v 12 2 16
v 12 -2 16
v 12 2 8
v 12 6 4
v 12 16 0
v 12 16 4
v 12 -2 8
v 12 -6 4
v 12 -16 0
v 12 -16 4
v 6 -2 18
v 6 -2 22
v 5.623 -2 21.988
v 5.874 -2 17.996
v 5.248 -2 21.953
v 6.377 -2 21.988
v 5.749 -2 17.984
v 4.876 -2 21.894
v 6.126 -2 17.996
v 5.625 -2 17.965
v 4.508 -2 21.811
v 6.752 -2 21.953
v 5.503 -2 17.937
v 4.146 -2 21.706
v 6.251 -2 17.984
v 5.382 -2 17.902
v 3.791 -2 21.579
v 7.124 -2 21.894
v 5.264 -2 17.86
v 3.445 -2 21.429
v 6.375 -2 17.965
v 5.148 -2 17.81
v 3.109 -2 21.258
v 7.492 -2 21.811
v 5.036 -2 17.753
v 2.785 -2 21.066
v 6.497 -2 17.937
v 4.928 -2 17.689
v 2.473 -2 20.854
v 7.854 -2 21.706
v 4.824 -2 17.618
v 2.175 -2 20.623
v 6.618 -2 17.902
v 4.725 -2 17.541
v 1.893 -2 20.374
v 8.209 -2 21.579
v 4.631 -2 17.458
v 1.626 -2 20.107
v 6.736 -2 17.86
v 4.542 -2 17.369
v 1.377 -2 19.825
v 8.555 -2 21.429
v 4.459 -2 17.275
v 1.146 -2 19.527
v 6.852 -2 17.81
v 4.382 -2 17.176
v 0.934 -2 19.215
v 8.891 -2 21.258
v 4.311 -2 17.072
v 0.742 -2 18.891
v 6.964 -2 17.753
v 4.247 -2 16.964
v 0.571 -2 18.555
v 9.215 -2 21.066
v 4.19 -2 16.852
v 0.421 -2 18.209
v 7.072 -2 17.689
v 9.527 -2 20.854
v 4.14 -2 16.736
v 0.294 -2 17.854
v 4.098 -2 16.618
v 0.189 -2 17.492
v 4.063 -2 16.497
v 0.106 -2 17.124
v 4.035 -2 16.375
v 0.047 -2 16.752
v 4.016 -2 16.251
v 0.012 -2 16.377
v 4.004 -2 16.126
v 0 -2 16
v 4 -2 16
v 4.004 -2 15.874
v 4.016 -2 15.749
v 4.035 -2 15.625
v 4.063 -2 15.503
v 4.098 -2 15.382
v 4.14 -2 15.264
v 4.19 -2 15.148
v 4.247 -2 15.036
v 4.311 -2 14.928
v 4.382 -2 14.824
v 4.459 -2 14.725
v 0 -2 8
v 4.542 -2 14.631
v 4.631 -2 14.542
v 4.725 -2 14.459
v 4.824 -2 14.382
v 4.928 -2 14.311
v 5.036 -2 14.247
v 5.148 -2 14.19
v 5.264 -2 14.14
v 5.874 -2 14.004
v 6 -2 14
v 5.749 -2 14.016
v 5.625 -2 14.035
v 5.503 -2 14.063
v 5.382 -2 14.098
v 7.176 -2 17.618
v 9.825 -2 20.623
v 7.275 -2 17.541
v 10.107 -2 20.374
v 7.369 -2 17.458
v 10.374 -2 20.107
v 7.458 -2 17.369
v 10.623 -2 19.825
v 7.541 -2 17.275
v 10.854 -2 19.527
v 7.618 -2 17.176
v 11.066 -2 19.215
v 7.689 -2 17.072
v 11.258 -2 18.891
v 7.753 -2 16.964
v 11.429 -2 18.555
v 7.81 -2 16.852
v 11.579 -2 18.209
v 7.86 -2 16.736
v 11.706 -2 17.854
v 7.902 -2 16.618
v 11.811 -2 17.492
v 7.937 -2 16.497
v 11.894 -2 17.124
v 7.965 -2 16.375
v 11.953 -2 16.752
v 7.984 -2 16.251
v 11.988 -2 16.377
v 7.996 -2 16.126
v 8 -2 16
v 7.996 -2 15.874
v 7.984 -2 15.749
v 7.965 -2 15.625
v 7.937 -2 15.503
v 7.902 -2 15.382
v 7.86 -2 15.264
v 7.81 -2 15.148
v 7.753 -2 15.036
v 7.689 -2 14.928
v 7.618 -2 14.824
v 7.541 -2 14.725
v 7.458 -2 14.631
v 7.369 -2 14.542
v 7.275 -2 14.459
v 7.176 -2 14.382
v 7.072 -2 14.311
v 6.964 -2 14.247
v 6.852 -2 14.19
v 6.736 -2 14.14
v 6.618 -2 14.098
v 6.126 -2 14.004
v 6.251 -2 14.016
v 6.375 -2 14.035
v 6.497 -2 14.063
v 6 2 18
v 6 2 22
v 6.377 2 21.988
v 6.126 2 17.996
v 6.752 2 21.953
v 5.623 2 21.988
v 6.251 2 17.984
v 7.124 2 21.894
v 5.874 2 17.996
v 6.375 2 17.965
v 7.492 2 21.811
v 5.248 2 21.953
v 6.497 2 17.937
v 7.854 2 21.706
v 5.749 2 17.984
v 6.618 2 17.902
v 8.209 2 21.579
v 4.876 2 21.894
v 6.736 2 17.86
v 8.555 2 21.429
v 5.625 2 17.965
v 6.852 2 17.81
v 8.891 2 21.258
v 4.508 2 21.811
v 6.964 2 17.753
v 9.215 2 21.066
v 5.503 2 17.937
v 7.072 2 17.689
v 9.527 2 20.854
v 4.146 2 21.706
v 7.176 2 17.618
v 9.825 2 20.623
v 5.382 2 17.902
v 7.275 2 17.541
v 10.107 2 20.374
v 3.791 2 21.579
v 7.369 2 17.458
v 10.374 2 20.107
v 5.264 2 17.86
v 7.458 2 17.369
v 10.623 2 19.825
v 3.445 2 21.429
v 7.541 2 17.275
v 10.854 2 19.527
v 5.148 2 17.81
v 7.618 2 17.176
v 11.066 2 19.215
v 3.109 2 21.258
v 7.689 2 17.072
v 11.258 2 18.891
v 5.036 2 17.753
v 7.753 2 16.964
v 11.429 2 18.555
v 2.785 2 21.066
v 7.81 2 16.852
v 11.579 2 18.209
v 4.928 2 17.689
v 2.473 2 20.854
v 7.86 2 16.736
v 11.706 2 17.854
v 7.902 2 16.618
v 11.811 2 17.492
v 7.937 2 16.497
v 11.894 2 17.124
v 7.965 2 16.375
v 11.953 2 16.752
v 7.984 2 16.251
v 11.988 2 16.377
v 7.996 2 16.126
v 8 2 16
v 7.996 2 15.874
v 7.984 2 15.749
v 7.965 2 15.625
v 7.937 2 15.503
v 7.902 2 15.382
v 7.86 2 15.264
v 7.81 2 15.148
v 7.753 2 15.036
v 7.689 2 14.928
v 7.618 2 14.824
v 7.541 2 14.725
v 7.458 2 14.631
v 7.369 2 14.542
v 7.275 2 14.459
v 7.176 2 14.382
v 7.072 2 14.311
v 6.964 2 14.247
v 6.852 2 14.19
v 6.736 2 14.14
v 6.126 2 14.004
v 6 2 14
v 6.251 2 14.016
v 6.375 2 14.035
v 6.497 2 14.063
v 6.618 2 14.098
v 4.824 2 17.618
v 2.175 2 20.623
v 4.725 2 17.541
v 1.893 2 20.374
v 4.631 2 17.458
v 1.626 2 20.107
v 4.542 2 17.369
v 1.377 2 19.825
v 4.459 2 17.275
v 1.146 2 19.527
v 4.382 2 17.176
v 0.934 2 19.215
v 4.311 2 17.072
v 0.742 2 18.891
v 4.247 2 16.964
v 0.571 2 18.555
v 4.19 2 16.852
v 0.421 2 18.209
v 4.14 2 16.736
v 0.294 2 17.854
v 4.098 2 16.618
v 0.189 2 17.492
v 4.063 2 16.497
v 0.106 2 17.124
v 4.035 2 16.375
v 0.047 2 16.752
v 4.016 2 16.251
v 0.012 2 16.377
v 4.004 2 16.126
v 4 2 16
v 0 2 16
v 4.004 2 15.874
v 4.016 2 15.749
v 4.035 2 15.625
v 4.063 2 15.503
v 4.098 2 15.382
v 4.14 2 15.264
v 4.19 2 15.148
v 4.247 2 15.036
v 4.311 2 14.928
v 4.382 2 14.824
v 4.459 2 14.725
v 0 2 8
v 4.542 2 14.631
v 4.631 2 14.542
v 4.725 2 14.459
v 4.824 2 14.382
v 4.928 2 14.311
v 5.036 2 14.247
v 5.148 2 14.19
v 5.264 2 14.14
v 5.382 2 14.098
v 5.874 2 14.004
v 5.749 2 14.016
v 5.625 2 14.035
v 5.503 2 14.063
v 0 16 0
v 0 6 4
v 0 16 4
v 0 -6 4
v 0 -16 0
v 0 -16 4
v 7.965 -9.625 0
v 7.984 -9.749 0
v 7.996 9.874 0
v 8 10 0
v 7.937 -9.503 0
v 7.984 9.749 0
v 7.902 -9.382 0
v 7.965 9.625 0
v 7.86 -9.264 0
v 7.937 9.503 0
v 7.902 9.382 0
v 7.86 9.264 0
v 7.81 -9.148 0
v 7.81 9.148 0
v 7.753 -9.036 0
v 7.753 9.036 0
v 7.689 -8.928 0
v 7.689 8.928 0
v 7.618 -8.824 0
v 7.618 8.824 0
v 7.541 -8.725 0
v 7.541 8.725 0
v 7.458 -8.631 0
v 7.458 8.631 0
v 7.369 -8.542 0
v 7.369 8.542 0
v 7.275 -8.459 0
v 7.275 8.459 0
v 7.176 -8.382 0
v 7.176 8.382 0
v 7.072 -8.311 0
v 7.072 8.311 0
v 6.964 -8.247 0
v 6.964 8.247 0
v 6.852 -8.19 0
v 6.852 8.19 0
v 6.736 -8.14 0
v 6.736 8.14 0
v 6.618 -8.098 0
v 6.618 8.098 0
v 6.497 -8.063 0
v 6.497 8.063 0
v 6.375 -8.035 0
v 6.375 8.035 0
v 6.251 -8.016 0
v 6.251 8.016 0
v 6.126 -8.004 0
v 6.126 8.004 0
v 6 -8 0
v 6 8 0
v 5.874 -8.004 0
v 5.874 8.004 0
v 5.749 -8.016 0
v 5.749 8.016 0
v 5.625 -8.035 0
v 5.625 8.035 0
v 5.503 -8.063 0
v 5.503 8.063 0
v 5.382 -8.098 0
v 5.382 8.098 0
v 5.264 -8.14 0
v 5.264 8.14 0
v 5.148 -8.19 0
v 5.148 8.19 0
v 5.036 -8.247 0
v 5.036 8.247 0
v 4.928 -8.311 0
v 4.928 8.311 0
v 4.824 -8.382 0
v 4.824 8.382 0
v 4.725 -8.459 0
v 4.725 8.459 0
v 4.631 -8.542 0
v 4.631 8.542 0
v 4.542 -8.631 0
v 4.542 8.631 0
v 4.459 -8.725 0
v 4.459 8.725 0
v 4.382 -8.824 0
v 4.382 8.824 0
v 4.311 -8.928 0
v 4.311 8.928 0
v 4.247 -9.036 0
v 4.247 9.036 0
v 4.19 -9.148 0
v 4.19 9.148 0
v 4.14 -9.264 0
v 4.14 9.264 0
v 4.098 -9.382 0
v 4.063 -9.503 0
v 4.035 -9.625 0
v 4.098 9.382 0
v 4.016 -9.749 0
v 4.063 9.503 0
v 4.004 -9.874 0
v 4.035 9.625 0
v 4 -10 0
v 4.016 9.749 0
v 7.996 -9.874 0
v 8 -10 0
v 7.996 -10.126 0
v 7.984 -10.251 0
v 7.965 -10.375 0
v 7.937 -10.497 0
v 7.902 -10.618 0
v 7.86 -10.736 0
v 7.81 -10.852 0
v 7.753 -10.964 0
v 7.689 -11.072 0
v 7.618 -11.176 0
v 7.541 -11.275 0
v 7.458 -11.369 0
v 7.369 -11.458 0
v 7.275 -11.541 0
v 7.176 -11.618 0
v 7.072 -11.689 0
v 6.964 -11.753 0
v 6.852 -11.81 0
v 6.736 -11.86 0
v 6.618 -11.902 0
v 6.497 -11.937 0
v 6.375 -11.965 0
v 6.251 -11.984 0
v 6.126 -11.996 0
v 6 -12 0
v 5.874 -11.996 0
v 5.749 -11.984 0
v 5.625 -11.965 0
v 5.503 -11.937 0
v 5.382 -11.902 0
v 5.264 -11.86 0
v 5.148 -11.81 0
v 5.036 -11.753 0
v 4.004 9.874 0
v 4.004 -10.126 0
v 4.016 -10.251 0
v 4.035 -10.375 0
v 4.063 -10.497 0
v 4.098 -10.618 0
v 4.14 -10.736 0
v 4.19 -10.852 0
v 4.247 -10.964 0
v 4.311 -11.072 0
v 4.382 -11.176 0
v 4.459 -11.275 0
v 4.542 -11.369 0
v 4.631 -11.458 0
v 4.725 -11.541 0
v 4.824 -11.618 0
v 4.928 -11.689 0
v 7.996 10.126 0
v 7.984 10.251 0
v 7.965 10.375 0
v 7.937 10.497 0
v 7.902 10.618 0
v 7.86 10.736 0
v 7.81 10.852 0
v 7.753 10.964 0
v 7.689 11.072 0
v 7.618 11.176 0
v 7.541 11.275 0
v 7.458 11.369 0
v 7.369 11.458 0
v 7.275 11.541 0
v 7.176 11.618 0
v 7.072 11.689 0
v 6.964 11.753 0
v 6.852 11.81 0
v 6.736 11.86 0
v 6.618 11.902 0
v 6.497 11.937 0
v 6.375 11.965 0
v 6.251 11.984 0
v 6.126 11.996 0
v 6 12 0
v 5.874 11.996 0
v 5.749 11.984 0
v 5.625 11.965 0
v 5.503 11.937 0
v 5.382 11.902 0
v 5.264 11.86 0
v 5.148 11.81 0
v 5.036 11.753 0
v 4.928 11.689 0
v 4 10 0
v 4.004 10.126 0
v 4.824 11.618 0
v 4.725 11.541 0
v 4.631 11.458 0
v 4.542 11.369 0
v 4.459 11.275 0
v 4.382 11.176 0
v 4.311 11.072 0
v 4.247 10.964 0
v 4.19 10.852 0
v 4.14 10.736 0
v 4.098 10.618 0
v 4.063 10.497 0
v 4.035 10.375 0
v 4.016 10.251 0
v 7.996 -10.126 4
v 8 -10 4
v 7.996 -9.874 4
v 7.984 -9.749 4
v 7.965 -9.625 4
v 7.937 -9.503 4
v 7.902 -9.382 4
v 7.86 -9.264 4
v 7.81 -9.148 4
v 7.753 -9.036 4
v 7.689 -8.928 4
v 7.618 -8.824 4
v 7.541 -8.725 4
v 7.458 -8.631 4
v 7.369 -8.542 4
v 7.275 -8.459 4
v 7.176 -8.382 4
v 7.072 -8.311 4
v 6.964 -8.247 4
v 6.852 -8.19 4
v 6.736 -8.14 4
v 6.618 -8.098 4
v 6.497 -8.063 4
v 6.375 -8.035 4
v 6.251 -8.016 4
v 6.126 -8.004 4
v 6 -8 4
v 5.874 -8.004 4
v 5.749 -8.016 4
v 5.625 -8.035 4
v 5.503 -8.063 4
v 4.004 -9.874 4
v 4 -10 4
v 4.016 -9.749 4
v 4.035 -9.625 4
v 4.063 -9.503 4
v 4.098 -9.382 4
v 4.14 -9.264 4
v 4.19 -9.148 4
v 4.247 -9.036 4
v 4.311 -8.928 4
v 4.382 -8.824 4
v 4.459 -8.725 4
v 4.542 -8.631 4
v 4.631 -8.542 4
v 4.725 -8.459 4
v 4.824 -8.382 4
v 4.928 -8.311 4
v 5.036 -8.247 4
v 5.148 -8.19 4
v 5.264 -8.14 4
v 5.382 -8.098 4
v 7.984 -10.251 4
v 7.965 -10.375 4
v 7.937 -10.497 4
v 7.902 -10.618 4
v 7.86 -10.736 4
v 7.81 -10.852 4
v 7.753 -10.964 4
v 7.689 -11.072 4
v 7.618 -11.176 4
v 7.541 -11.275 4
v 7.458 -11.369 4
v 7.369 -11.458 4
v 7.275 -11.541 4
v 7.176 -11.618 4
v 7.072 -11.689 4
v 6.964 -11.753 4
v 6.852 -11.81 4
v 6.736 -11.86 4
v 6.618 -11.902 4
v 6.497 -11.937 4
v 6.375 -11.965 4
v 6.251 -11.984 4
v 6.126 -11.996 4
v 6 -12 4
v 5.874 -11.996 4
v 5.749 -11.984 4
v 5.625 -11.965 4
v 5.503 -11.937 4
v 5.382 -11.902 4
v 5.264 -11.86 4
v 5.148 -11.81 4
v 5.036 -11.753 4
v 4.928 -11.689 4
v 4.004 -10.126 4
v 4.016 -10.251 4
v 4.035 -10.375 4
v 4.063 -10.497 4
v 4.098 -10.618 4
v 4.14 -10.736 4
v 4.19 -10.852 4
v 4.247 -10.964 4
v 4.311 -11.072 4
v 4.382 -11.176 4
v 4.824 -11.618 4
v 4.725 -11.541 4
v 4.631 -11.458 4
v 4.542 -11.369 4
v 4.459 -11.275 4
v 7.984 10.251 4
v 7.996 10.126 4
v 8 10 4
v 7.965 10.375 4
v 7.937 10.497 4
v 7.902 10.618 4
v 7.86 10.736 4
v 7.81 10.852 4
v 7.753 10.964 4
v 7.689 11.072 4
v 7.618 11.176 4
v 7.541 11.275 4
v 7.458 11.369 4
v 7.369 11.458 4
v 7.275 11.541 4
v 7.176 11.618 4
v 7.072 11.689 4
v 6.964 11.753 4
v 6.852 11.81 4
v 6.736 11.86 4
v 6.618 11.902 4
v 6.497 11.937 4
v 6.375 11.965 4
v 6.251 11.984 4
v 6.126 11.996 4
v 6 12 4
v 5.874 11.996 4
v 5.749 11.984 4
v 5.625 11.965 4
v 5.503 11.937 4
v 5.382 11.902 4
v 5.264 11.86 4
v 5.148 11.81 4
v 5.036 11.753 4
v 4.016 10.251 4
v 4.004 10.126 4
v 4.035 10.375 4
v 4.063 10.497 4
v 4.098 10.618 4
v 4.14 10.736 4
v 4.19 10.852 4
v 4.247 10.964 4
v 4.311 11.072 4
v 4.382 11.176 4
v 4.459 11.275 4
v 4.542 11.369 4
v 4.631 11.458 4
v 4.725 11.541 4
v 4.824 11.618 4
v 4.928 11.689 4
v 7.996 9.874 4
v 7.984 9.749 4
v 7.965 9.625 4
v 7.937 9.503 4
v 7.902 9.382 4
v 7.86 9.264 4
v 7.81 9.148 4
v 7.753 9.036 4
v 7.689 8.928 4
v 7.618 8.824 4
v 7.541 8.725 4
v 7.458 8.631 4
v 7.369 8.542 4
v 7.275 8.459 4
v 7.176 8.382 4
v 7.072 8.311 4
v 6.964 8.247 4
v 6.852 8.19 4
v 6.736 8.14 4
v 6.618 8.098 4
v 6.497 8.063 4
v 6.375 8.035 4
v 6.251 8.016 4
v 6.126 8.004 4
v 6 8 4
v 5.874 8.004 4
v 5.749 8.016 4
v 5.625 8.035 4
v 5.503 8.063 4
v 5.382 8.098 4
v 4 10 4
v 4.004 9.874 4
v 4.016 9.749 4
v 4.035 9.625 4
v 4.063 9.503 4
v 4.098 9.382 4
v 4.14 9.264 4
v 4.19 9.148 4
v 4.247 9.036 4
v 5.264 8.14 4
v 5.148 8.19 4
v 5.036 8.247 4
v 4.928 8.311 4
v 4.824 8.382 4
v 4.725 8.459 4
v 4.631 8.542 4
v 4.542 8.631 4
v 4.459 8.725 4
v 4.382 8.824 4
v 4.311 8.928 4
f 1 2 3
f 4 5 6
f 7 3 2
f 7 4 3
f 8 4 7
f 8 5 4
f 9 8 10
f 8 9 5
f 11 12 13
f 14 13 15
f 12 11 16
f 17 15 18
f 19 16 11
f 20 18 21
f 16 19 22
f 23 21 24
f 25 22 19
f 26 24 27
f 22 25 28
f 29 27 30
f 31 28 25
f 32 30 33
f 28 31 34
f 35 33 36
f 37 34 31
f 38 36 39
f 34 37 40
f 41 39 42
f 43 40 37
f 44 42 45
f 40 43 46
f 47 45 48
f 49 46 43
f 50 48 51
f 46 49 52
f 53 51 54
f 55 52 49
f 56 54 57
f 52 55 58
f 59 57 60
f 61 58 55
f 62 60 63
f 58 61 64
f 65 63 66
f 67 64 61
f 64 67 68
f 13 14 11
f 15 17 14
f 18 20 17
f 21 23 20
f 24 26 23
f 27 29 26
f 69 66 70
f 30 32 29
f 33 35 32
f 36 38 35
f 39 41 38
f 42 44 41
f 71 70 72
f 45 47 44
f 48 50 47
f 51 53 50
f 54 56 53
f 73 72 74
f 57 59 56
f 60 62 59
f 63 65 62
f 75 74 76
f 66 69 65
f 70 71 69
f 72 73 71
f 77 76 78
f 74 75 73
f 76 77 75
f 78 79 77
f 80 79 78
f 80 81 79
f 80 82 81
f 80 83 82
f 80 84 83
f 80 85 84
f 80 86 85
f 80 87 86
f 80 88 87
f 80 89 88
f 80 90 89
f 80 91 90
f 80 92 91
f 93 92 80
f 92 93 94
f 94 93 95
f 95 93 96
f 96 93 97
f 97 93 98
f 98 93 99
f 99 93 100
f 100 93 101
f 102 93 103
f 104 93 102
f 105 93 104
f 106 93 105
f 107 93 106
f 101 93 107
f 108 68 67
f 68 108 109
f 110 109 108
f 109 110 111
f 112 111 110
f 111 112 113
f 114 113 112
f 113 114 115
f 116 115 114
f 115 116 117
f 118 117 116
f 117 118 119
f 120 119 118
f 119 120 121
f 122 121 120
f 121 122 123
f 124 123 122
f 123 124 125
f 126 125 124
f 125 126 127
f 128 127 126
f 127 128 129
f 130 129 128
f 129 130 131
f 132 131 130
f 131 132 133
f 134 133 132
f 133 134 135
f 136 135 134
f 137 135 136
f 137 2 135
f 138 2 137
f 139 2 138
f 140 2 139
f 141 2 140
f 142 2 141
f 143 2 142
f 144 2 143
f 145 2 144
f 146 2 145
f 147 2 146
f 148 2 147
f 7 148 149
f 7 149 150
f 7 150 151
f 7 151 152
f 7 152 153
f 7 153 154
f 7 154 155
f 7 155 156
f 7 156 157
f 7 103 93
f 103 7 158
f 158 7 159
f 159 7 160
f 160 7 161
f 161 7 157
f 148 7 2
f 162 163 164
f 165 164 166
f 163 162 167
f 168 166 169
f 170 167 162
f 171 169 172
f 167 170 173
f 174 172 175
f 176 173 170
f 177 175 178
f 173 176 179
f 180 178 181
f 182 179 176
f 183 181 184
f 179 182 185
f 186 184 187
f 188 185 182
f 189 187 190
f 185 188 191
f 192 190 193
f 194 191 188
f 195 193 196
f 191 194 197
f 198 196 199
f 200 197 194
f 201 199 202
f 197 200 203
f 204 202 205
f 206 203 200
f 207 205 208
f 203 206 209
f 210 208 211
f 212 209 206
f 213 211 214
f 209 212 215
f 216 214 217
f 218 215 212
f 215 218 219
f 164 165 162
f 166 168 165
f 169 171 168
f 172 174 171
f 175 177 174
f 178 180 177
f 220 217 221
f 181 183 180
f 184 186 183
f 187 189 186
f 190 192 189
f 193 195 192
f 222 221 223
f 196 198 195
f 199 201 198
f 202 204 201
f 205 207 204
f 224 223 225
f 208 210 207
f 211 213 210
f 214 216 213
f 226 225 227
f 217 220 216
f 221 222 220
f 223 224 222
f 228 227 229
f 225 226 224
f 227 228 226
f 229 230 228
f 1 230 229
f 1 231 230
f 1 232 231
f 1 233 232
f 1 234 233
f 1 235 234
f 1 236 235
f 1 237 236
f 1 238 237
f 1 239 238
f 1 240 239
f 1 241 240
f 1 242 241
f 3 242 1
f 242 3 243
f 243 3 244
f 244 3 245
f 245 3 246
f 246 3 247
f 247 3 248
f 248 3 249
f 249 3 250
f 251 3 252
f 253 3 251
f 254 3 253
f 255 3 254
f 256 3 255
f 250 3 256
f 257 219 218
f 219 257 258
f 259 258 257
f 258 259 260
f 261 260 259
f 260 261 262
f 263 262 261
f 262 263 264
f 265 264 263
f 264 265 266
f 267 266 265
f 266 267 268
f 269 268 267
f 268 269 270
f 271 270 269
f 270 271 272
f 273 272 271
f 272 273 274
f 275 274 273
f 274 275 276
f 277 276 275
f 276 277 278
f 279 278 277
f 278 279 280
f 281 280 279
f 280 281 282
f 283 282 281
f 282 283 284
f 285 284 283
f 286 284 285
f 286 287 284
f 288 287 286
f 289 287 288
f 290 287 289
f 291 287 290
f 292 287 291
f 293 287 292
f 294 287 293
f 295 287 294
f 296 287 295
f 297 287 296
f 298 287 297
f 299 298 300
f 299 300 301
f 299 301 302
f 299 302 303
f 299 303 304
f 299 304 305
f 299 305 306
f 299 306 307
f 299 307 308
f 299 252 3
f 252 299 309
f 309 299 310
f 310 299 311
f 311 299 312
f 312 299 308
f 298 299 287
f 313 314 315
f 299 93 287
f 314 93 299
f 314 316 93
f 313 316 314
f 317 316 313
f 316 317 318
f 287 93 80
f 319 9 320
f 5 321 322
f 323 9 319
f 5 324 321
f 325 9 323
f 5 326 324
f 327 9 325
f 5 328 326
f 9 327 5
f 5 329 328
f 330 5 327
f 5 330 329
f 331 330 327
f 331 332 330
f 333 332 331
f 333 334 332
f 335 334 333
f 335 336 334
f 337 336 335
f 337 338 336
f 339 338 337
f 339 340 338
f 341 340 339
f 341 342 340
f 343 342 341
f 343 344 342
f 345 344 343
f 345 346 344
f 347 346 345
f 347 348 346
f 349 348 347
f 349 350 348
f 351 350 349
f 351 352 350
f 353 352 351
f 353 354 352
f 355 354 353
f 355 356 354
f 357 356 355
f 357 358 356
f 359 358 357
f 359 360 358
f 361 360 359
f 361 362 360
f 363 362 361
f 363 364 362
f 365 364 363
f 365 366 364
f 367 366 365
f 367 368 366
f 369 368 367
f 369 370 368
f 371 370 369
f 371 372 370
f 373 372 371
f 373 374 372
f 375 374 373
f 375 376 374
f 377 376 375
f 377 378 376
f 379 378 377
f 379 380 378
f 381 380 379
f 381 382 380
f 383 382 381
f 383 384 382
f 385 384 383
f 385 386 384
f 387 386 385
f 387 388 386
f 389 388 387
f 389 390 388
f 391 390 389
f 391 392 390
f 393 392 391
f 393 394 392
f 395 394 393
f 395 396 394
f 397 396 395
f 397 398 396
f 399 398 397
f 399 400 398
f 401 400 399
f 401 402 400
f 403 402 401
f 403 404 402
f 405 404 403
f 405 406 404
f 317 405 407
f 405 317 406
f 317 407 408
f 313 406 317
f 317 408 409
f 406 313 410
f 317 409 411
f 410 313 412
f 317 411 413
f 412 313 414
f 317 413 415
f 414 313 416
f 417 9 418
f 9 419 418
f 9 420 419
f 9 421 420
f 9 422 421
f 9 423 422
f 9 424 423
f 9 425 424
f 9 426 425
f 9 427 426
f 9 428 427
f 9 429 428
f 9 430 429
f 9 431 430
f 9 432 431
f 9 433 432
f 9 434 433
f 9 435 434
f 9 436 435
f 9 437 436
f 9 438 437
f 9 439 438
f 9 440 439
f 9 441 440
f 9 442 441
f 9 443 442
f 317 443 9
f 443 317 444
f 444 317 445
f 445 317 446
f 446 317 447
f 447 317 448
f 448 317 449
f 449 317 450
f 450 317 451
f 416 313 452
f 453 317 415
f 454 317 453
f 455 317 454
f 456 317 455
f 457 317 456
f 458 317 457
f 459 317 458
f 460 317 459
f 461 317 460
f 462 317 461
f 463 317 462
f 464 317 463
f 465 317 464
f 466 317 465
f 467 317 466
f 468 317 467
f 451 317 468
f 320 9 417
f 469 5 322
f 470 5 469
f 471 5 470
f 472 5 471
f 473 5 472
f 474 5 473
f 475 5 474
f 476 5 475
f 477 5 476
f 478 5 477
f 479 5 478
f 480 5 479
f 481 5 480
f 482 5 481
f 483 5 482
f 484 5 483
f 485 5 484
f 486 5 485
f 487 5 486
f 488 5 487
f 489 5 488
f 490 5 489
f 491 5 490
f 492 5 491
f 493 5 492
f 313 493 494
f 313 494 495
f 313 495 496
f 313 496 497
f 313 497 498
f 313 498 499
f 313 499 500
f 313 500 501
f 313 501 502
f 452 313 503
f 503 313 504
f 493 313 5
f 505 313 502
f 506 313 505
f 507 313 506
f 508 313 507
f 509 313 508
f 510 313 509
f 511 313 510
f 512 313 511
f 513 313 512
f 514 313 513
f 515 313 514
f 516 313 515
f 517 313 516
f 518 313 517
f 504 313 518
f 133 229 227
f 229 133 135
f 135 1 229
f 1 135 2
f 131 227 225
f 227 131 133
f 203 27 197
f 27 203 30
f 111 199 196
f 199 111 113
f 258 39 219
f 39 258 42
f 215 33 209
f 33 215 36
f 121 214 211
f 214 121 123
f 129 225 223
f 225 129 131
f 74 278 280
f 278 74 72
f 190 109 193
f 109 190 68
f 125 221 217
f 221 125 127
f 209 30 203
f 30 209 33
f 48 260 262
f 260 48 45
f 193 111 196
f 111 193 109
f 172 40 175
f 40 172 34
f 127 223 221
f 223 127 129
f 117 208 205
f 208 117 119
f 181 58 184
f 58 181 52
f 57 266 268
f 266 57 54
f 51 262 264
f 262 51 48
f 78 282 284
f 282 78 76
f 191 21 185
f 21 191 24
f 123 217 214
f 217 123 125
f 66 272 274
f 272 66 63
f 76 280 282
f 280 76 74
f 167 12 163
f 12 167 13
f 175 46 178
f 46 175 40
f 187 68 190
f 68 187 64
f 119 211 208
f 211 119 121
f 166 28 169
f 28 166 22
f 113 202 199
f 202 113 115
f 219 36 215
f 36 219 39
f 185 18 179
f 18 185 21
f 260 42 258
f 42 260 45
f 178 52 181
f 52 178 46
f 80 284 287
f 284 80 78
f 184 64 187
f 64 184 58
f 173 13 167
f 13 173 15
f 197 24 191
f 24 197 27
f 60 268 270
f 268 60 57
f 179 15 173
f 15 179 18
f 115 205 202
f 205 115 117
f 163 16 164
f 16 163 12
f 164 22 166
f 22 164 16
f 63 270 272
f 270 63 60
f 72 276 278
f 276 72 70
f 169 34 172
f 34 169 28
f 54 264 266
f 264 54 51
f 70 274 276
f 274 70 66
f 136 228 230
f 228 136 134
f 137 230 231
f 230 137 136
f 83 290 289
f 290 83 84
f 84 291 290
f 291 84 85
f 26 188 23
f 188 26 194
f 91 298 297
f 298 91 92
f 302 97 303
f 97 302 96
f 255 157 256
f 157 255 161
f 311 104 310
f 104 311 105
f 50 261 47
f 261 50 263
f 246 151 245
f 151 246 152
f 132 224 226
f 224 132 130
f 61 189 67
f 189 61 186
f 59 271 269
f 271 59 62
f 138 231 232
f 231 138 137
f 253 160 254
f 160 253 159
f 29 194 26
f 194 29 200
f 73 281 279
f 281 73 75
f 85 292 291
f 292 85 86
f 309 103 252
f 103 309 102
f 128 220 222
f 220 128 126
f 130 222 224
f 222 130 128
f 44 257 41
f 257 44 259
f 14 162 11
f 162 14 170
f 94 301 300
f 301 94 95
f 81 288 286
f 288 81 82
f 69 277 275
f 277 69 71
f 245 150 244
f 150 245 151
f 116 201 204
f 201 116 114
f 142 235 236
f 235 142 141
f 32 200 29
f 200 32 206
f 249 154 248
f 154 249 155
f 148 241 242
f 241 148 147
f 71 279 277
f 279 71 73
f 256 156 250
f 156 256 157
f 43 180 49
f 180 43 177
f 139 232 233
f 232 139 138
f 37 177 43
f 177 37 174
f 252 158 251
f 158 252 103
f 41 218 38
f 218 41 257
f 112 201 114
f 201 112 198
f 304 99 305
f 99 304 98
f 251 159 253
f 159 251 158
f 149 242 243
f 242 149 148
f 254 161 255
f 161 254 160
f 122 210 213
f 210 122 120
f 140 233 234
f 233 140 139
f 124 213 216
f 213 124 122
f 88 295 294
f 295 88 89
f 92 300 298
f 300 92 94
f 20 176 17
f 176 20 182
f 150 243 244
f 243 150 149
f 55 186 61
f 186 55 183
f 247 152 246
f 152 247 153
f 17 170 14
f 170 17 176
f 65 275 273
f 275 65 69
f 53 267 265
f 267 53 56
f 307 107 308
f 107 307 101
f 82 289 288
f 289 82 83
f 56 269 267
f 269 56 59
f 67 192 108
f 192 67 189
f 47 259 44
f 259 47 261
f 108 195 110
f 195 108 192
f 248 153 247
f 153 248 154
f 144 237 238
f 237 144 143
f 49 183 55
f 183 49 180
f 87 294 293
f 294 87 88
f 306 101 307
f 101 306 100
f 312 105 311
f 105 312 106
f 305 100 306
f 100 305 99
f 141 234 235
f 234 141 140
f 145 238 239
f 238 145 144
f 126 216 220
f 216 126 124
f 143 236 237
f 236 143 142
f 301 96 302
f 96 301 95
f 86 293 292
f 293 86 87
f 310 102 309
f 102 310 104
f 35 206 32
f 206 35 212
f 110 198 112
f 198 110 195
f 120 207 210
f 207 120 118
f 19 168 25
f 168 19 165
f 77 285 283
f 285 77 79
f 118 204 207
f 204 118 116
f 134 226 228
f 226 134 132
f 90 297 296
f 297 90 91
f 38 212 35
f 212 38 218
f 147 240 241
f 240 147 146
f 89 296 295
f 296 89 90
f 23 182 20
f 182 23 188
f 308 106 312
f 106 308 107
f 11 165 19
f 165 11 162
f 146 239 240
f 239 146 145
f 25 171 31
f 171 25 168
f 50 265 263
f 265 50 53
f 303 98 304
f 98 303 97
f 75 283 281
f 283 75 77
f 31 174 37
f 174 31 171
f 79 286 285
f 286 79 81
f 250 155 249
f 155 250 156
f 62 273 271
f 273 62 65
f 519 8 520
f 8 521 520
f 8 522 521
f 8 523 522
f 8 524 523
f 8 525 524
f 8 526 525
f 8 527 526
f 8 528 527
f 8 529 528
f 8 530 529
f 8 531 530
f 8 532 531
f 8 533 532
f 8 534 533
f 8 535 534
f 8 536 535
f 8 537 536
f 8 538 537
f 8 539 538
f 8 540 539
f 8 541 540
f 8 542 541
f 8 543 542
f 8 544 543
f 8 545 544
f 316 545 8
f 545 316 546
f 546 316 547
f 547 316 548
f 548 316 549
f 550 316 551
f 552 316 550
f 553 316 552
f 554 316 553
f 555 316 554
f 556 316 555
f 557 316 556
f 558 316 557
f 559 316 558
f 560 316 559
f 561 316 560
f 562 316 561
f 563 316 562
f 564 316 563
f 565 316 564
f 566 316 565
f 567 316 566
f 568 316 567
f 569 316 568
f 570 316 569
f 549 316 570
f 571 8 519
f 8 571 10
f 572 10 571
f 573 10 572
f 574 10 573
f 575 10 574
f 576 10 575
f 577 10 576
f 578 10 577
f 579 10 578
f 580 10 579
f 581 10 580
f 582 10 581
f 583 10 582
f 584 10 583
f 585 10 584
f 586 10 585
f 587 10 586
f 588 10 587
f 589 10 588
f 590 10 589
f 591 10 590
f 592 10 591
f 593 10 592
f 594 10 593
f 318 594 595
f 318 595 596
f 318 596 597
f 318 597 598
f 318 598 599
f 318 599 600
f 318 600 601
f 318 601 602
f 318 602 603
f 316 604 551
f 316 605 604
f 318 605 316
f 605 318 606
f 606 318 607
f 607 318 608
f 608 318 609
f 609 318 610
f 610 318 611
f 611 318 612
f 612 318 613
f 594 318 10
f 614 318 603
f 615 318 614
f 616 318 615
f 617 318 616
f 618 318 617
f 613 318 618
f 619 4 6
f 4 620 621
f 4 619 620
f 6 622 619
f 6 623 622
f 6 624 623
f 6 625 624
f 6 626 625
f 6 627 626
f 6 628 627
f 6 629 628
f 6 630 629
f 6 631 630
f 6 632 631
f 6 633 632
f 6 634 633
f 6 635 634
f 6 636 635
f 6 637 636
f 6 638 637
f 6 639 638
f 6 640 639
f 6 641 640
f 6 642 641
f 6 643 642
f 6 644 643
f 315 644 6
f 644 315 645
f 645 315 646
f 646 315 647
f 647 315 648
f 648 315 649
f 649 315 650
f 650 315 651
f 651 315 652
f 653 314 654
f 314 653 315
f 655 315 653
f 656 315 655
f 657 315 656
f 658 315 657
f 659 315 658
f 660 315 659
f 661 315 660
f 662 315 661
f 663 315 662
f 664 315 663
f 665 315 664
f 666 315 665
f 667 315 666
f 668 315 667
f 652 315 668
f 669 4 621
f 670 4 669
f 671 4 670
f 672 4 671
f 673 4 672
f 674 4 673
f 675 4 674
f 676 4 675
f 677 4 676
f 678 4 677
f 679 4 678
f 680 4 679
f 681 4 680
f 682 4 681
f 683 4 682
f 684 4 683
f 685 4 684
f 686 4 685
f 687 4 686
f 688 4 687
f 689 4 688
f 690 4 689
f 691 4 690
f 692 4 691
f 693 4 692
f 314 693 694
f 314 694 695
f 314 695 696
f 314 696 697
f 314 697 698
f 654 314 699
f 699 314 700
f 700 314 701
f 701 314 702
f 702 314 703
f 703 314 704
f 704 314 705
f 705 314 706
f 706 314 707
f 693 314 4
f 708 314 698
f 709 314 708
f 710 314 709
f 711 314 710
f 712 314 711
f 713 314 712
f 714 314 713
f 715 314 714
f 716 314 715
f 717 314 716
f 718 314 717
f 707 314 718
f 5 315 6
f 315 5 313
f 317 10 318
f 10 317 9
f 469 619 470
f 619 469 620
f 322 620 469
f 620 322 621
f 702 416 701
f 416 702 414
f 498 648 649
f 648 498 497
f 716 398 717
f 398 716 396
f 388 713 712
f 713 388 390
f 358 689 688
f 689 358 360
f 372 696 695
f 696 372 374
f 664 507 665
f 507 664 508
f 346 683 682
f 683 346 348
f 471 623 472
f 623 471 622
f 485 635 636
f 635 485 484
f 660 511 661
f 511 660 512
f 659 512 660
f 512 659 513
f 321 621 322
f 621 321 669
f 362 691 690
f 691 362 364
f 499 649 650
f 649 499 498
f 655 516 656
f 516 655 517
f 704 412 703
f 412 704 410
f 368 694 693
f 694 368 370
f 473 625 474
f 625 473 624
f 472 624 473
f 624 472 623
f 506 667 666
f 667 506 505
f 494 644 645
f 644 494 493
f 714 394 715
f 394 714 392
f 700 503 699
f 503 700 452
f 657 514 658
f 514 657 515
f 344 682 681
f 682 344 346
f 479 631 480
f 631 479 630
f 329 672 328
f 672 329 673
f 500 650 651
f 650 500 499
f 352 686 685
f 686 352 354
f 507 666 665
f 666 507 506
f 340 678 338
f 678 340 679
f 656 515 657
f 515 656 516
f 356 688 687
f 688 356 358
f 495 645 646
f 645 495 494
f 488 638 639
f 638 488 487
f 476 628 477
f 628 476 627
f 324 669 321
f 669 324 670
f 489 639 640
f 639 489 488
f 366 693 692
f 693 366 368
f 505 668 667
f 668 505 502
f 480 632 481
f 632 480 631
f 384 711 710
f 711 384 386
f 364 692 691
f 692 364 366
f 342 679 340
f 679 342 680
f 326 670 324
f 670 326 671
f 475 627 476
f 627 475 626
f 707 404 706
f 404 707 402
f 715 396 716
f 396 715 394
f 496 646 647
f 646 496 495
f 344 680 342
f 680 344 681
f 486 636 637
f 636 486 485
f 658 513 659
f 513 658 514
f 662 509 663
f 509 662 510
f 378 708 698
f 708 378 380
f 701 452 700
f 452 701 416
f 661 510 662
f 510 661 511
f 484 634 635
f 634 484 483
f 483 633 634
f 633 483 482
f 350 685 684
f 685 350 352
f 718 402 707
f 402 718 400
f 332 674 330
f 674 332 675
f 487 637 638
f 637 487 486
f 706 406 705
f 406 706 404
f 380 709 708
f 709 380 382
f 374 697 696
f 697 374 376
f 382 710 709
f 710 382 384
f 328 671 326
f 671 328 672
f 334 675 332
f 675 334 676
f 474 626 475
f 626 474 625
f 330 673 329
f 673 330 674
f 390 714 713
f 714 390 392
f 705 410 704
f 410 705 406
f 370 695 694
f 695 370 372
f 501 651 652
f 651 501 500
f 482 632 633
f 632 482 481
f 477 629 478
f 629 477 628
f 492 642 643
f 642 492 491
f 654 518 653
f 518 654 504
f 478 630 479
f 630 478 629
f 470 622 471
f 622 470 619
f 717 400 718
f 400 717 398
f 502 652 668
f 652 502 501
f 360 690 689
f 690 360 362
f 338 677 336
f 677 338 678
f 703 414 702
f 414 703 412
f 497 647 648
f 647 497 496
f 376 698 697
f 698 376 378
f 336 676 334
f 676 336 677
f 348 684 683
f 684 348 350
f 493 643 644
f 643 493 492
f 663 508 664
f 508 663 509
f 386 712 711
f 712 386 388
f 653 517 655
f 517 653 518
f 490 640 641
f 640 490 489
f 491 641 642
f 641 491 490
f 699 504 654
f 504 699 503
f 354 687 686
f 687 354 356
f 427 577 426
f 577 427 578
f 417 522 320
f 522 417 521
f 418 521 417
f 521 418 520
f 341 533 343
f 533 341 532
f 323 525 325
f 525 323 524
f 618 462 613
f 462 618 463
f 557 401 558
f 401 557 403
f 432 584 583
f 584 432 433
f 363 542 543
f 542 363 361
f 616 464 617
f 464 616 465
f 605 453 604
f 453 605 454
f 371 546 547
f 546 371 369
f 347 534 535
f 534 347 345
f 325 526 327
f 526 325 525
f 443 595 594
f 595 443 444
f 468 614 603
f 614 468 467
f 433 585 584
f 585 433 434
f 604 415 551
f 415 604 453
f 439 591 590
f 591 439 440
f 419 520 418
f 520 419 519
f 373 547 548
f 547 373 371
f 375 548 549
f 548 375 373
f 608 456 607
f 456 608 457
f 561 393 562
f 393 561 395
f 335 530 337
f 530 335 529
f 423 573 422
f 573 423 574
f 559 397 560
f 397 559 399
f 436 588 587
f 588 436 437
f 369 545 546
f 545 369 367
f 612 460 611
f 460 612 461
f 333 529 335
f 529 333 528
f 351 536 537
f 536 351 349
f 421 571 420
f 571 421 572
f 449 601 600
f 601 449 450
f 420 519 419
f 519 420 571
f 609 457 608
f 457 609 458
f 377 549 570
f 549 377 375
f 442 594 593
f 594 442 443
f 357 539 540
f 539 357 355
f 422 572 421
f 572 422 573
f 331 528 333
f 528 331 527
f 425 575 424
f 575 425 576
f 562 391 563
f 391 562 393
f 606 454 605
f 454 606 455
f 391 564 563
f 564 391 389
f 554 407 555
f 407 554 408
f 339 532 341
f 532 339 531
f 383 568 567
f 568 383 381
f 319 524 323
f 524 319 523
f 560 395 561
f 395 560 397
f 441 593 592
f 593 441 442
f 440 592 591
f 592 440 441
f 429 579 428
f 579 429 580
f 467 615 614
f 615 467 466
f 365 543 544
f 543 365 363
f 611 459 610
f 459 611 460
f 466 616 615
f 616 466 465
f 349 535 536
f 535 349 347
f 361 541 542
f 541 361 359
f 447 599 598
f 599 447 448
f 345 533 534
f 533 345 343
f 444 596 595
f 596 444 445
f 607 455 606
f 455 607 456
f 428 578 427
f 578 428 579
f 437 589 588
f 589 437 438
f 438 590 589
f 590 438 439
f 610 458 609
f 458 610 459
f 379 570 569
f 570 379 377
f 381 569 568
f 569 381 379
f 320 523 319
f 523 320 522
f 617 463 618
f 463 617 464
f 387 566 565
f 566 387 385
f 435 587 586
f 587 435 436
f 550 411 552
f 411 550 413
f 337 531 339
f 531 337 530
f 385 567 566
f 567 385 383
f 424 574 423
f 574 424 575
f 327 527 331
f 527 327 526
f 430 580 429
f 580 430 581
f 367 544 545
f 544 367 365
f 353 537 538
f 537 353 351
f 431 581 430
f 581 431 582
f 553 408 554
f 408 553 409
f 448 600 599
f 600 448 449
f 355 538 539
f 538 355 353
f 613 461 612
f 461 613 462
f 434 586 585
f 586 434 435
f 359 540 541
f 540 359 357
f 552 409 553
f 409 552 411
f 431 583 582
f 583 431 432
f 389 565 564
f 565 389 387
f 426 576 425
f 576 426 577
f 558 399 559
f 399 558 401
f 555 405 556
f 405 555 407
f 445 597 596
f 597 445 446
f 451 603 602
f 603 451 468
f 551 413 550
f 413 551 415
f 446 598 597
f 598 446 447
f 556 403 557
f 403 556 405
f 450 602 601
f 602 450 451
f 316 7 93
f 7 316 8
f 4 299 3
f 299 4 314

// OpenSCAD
$fn=100;

hole_d=4;
hole_h=10;
T=4;

module arm() {
    difference() {
        union() {
            cube([hole_d*3, hole_d*1.5 + hole_h, T]);
            translate([hole_d*1.5, hole_h + hole_d*1.5, 0]) cylinder(d=hole_d*3, h=T);
        }
        translate([hole_d*1.5, hole_h + hole_d*1.5, 0]) cylinder(d=hole_d, h=T);
    }
}

union() {
    translate([0, T/2, 0]) rotate([90, 0, 0]) arm();
    translate([0, 0, T]) rotate([0, 90, 0]) linear_extrude(hole_d*3) polygon([ [0, -1.5*T], [-T, -T*.5], [-T, T*.5], [0, 1.5*T], [0, -1.5*T] ]);
    difference() {
        base=[hole_d*3, (hole_d*3+T)*2, T];
        translate([0, -base[1]/2, 0]) cube(base);
        translate([base[0]/2, base[1]/2 - T - hole_d/2, 0]) cylinder(d=hole_d, h=T);
        translate([base[0]/2, -(base[1]/2 - T - hole_d/2), 0]) cylinder(d=hole_d, h=T);
    }
}
